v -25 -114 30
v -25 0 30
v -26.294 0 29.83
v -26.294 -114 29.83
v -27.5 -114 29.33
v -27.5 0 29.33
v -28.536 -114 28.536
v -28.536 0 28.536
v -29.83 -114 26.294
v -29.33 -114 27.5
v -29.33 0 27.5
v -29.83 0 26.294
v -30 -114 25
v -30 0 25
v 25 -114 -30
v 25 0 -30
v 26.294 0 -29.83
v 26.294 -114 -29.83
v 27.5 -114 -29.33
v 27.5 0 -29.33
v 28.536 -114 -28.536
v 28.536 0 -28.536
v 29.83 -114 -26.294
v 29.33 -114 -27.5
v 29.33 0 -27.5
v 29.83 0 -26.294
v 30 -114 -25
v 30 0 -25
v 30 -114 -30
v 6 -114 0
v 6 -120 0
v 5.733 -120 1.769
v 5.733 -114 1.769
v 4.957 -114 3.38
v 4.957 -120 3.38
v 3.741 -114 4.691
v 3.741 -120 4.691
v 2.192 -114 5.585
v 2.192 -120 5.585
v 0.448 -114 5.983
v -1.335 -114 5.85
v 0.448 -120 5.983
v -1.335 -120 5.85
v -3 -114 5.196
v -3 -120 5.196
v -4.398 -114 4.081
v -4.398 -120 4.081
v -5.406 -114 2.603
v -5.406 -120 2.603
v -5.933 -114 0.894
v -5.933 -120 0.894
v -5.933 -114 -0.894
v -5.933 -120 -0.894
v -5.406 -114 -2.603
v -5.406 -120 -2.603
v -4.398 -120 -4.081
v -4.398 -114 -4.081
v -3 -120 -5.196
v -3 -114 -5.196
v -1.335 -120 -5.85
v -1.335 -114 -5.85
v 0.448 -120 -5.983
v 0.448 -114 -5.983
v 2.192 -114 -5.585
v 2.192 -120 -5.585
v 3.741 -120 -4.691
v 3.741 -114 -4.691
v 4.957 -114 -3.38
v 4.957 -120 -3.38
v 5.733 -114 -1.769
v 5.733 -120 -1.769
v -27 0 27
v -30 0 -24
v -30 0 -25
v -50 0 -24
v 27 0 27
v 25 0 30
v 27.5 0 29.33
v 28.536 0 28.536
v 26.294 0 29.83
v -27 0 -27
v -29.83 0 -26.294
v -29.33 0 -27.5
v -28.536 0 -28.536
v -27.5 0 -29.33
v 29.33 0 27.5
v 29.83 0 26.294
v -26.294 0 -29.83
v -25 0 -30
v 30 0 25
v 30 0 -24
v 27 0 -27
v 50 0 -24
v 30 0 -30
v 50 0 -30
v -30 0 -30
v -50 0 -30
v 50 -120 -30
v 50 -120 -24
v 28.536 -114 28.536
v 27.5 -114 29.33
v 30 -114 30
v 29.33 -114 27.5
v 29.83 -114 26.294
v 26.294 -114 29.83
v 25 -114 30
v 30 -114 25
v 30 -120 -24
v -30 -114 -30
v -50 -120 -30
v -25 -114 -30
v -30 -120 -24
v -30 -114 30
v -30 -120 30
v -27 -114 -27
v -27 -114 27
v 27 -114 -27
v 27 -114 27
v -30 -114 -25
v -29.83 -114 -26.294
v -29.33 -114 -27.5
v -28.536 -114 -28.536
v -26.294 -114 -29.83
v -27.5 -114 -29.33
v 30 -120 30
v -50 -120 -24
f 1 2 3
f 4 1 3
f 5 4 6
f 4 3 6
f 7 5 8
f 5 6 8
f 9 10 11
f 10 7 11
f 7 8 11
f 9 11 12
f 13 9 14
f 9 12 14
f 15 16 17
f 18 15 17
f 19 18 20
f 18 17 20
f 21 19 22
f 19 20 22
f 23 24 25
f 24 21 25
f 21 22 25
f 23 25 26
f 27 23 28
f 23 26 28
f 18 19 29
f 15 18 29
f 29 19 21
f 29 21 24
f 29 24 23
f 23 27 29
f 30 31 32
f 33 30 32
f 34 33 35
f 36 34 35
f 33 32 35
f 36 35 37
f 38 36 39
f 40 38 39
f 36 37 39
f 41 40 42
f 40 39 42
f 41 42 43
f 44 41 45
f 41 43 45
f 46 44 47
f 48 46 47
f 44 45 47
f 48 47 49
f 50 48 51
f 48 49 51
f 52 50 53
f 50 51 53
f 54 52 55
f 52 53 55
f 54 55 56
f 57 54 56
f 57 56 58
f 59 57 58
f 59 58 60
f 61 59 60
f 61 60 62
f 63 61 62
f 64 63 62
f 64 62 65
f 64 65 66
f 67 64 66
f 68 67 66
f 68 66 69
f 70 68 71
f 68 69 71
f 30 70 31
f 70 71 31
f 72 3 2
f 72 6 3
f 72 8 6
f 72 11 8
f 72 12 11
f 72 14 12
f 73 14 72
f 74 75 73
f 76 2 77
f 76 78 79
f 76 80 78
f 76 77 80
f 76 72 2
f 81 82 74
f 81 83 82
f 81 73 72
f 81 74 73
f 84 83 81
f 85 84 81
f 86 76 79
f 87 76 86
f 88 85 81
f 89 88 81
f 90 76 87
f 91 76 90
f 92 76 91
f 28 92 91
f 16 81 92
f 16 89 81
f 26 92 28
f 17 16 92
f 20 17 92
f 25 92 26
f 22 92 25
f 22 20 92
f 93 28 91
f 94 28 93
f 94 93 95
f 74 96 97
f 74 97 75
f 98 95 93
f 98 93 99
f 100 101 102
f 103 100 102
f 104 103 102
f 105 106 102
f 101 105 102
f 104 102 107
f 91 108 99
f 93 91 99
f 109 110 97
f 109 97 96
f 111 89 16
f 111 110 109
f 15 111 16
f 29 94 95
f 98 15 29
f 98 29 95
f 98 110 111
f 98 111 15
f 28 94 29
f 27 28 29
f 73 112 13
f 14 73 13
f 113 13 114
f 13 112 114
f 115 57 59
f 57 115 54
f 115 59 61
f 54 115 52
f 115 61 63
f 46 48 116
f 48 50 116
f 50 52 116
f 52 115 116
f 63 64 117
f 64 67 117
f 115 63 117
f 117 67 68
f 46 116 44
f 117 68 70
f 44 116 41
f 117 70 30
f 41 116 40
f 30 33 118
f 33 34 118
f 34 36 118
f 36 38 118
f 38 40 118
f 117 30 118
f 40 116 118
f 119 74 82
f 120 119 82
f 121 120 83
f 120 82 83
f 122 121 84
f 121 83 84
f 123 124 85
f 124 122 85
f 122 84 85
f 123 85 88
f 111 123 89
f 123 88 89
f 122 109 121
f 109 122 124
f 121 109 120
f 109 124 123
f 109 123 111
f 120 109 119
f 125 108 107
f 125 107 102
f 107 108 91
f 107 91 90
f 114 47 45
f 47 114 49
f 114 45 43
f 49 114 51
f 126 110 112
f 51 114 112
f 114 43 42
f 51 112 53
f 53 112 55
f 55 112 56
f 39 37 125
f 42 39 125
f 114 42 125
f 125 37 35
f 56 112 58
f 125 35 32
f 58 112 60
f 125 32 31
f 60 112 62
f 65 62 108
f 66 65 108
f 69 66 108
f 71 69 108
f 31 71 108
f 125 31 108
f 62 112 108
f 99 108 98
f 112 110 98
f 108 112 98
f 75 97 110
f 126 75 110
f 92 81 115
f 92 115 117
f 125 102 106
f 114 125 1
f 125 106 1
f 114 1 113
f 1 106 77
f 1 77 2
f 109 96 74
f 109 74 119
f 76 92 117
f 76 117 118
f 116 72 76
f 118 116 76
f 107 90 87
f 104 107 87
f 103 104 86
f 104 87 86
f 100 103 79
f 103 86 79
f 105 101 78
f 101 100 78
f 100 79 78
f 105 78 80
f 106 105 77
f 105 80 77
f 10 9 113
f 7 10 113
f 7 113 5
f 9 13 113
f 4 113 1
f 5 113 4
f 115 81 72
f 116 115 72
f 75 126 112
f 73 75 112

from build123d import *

# Parameters (mm, degrees)
F0_W     = 54
F0_H     = 54
F1_DEPTH = 120
F2_W     = 60
F2_H     = 60
F2_R     = 6
F3_DEPTH = 6
F4_W     = 20
F4_H     = 120
F5_DEPTH = 6


with BuildPart() as f1:
    # F0 (on Front) → F1 (new body)
    with BuildSketch(Plane.XZ):
        with BuildLine():
            ThreePointArc((30, 25), (28.5355339059, 28.5355339059), (25, 30))
            Line((25, 30), (-25, 30))
            ThreePointArc((-25, 30), (-28.5355339059, 28.5355339059), (-30, 25))
            Line((-30, 25), (-30, -25))
            ThreePointArc((-30, -25), (-28.5355339059, -28.5355339059), (-25, -30))
            Line((-25, -30), (25, -30))
            ThreePointArc((25, -30), (28.5355339059, -28.5355339059), (30, -25))
            Line((30, -25), (30, 25))
        make_face()
        Rectangle(F0_W, F0_H, mode=Mode.SUBTRACT)
    extrude(amount=F1_DEPTH)

    # F2 (on face) → F3 (join)
    with BuildSketch(Plane.XZ.offset(120)):
        Rectangle(F2_W, F2_H)
        Circle(F2_R, mode=Mode.SUBTRACT)
    extrude(amount=-F3_DEPTH)

    # F4 (on face) → F5 (join)
    with BuildSketch(Plane(origin=(0, 0, -30), x_dir=(1, 0, 0), z_dir=(0, 0, -1))):
        with Locations((40, 60)):
            Rectangle(F4_W, F4_H)
        with Locations((-40, 60)):
            Rectangle(F4_W, F4_H)
    extrude(amount=-F5_DEPTH)


solid = f1.part
